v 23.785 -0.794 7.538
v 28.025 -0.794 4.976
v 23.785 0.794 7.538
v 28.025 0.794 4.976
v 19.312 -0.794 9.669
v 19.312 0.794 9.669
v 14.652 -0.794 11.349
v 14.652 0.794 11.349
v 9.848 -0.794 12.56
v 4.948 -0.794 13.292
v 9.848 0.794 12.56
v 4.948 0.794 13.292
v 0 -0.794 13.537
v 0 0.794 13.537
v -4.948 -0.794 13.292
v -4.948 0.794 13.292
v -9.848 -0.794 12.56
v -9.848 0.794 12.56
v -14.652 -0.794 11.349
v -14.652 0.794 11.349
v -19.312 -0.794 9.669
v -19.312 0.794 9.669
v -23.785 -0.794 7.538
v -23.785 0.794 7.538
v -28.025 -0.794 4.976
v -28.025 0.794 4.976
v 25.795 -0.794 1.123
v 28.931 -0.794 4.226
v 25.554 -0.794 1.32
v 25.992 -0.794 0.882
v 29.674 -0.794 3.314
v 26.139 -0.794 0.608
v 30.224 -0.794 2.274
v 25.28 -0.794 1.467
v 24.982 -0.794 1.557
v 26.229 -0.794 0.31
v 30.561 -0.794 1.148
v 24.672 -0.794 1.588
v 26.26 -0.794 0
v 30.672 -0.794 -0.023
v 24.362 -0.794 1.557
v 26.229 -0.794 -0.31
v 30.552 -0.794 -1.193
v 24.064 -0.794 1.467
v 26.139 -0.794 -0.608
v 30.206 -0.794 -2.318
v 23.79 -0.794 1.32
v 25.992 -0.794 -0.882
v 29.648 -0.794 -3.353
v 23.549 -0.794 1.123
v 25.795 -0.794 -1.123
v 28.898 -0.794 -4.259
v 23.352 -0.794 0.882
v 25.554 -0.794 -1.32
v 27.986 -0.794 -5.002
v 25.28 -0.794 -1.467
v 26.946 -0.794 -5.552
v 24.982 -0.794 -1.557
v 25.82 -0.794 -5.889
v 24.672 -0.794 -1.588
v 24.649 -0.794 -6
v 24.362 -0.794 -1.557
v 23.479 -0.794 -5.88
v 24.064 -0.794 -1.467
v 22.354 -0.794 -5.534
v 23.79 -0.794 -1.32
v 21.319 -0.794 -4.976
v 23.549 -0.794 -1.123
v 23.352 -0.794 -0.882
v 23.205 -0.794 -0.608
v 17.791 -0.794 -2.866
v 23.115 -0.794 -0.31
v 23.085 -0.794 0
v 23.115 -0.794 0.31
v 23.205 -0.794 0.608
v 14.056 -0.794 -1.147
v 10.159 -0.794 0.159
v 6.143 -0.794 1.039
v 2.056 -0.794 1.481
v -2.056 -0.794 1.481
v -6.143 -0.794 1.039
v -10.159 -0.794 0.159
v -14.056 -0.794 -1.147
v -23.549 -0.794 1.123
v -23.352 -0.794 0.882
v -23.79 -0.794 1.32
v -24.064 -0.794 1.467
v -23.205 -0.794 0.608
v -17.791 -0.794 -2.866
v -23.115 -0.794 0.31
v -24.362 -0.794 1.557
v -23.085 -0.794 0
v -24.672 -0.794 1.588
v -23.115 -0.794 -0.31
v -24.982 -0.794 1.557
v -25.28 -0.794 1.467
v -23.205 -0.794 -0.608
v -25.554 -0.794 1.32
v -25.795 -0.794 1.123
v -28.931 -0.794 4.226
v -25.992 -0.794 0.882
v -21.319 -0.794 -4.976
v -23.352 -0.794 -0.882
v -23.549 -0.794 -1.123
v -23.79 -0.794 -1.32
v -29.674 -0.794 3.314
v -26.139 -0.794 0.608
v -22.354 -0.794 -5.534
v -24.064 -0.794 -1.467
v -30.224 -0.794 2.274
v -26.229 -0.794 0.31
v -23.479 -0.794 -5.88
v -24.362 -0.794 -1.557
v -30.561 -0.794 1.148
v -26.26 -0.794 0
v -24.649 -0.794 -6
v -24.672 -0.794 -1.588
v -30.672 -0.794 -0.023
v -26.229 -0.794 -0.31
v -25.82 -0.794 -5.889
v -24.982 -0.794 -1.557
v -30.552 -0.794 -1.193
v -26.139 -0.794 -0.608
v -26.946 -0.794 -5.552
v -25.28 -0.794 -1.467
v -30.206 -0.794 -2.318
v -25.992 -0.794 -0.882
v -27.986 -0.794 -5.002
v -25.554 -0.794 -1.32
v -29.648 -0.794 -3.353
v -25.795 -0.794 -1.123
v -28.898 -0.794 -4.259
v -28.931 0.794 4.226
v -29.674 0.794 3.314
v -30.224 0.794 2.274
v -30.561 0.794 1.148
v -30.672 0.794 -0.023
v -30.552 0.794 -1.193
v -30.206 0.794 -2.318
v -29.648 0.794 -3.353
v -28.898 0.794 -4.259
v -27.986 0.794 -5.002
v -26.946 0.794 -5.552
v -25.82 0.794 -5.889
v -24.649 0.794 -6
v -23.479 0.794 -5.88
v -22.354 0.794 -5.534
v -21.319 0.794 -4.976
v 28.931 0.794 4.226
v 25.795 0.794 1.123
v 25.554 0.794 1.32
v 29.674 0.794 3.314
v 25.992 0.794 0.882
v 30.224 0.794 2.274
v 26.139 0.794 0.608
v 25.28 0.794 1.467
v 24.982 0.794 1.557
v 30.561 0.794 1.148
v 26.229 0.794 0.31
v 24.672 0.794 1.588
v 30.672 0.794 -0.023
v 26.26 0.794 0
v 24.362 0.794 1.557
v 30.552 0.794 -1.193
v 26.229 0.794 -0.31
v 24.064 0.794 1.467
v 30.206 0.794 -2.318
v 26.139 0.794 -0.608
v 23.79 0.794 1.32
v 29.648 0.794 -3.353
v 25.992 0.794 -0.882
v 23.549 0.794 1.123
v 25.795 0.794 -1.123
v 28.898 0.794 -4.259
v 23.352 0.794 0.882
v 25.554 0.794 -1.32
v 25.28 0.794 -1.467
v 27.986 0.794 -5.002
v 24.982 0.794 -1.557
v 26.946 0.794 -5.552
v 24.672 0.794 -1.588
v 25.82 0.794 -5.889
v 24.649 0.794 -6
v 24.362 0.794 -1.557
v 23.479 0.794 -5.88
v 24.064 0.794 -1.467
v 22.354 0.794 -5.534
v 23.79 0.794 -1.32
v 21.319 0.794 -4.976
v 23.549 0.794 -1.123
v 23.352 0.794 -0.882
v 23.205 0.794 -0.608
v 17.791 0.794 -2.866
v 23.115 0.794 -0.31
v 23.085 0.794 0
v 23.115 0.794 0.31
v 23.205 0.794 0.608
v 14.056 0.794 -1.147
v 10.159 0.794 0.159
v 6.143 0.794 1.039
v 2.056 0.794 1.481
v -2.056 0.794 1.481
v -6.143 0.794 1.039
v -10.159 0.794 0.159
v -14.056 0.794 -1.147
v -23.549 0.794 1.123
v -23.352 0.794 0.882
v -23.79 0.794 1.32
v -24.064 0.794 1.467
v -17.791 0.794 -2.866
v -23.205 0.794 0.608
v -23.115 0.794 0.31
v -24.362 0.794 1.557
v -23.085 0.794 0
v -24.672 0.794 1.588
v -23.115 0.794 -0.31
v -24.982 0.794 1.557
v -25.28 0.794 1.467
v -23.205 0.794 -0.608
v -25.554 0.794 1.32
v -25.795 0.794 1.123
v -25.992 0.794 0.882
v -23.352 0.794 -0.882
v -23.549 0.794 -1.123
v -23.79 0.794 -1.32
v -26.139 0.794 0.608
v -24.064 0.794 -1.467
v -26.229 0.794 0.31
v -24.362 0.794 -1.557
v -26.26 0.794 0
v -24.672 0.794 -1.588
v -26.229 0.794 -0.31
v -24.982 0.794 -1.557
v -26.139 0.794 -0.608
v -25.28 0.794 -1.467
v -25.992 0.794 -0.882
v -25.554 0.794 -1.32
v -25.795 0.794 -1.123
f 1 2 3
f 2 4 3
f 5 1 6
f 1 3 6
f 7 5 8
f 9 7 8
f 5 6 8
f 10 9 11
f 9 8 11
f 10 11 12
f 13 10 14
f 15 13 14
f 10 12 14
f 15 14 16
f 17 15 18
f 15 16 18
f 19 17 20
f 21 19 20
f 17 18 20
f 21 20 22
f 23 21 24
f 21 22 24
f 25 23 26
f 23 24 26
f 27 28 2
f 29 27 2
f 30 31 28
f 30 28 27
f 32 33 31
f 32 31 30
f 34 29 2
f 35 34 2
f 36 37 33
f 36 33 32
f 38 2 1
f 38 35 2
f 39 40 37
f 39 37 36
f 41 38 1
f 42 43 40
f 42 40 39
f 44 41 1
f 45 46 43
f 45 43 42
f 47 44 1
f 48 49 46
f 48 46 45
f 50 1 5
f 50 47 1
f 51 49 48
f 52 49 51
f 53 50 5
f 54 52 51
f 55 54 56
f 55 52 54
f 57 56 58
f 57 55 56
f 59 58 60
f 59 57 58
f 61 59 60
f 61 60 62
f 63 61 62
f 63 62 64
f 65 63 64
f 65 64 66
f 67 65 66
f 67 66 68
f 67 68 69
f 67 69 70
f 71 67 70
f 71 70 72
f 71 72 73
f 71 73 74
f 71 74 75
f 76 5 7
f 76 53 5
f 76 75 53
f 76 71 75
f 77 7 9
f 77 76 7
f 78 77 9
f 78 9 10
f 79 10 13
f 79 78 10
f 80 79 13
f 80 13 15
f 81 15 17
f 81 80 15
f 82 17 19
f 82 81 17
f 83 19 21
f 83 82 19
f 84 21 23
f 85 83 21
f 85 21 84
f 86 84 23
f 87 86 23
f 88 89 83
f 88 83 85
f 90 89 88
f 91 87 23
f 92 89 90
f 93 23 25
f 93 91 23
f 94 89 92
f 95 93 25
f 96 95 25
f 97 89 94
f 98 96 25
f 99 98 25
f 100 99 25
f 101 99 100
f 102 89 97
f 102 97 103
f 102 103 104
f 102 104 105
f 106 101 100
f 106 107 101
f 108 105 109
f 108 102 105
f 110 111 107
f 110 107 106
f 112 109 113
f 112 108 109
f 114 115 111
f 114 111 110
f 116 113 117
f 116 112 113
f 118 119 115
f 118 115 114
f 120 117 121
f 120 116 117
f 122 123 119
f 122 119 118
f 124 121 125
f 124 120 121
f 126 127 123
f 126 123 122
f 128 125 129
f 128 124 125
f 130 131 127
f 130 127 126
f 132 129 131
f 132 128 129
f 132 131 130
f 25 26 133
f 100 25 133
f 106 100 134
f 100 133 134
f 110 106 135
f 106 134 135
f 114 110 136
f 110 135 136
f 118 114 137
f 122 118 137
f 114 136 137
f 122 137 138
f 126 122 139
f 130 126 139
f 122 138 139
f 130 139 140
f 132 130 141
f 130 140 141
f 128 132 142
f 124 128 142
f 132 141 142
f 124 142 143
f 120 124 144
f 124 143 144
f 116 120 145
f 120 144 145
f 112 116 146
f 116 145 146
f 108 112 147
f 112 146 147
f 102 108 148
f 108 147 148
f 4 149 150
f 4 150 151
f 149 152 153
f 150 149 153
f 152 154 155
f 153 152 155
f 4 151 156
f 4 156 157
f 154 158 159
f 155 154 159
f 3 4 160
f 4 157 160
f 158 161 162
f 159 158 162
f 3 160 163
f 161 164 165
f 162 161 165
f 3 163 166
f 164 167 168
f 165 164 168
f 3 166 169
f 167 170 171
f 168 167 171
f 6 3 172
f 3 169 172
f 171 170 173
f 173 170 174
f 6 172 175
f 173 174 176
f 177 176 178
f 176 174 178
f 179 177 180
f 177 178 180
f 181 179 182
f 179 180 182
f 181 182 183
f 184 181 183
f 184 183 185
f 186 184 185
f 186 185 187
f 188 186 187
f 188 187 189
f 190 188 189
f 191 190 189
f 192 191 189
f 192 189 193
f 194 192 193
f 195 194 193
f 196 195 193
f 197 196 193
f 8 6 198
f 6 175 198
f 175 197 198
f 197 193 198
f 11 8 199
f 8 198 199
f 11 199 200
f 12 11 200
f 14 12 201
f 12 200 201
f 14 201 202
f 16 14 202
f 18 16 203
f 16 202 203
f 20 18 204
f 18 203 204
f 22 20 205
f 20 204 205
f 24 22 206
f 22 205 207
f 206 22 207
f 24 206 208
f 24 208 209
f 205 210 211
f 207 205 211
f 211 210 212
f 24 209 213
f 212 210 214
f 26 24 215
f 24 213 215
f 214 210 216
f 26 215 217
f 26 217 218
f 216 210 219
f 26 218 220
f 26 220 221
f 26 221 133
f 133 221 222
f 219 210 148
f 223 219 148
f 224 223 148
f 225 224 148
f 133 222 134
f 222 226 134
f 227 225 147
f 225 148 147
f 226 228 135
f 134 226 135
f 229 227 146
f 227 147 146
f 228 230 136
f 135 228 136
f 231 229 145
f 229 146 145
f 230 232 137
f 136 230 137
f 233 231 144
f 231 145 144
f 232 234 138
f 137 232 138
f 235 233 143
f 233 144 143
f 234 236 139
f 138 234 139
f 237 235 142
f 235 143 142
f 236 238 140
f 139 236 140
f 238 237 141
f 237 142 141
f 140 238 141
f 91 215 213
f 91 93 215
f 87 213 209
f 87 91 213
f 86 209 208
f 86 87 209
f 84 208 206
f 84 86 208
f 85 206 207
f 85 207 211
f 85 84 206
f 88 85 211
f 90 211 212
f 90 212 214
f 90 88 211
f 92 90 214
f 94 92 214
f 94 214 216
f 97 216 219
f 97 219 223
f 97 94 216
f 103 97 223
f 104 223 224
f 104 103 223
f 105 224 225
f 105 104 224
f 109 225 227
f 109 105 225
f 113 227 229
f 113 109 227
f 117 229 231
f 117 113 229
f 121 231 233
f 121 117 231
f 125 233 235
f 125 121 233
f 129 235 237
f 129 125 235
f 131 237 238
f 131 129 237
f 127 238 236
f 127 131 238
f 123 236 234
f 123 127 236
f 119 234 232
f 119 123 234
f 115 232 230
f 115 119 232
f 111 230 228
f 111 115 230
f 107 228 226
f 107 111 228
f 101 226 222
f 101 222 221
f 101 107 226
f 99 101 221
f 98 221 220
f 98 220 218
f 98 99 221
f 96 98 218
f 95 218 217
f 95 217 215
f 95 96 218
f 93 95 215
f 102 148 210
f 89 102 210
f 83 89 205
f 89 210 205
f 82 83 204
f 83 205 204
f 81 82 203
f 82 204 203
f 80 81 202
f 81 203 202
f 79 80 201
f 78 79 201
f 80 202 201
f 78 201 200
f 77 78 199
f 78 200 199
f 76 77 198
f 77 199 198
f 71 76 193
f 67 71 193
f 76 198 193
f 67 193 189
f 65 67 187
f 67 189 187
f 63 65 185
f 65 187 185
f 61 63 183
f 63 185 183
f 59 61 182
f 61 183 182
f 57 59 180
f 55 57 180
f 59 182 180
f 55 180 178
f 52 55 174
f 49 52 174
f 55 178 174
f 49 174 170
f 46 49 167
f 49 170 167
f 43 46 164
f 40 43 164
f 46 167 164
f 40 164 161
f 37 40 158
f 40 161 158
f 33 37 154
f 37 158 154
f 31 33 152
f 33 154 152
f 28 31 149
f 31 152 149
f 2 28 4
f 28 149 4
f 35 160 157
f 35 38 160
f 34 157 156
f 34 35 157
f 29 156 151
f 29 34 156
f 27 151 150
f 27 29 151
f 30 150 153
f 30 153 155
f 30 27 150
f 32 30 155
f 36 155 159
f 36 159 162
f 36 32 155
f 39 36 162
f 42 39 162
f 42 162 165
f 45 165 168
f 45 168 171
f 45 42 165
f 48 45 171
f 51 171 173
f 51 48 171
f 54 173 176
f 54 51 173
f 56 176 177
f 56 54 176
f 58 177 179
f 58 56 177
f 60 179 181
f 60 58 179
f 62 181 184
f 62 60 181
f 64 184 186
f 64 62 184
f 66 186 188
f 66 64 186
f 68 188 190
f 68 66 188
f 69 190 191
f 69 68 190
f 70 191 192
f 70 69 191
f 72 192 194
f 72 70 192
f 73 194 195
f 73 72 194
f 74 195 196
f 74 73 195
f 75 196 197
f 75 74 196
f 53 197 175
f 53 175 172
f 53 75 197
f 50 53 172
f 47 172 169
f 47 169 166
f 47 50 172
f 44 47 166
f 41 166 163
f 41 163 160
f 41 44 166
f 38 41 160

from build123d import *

# Parameters (mm, degrees)
SKETCH1_R           = 1.5875
BOSS_EXTRUDE1_DEPTH = 0.79375


with BuildPart() as part:
    # Sketch1 → Boss-Extrude1 (new, symmetric)
    with BuildSketch(Plane(origin=(0, 0, 0), x_dir=(1, 0, 0), z_dir=(0, 1, 0))):
        with BuildLine():
            ThreePointArc((-21.319139699, 4.975774091), (0, -1.536759472), (21.319139699, 4.975774091))
            ThreePointArc((21.319139699, 4.975774091), (29.647774091, 3.352860301), (28.024860301, -4.975774091))
            ThreePointArc((28.024860301, -4.975774091), (0, -13.536759472), (-28.024860301, -4.975774091))
            ThreePointArc((-28.024860301, -4.975774091), (-29.647774091, 3.352860301), (-21.319139699, 4.975774091))
        make_face()
        with Locations(Location((-24.672, 0, 0), (0, 0, 270))):
            Circle(SKETCH1_R, mode=Mode.SUBTRACT)
        with Locations(Location((24.672, 0, 0), (0, 0, 270))):
            Circle(SKETCH1_R, mode=Mode.SUBTRACT)
    extrude(amount=BOSS_EXTRUDE1_DEPTH, both=True)


solid = part.part
